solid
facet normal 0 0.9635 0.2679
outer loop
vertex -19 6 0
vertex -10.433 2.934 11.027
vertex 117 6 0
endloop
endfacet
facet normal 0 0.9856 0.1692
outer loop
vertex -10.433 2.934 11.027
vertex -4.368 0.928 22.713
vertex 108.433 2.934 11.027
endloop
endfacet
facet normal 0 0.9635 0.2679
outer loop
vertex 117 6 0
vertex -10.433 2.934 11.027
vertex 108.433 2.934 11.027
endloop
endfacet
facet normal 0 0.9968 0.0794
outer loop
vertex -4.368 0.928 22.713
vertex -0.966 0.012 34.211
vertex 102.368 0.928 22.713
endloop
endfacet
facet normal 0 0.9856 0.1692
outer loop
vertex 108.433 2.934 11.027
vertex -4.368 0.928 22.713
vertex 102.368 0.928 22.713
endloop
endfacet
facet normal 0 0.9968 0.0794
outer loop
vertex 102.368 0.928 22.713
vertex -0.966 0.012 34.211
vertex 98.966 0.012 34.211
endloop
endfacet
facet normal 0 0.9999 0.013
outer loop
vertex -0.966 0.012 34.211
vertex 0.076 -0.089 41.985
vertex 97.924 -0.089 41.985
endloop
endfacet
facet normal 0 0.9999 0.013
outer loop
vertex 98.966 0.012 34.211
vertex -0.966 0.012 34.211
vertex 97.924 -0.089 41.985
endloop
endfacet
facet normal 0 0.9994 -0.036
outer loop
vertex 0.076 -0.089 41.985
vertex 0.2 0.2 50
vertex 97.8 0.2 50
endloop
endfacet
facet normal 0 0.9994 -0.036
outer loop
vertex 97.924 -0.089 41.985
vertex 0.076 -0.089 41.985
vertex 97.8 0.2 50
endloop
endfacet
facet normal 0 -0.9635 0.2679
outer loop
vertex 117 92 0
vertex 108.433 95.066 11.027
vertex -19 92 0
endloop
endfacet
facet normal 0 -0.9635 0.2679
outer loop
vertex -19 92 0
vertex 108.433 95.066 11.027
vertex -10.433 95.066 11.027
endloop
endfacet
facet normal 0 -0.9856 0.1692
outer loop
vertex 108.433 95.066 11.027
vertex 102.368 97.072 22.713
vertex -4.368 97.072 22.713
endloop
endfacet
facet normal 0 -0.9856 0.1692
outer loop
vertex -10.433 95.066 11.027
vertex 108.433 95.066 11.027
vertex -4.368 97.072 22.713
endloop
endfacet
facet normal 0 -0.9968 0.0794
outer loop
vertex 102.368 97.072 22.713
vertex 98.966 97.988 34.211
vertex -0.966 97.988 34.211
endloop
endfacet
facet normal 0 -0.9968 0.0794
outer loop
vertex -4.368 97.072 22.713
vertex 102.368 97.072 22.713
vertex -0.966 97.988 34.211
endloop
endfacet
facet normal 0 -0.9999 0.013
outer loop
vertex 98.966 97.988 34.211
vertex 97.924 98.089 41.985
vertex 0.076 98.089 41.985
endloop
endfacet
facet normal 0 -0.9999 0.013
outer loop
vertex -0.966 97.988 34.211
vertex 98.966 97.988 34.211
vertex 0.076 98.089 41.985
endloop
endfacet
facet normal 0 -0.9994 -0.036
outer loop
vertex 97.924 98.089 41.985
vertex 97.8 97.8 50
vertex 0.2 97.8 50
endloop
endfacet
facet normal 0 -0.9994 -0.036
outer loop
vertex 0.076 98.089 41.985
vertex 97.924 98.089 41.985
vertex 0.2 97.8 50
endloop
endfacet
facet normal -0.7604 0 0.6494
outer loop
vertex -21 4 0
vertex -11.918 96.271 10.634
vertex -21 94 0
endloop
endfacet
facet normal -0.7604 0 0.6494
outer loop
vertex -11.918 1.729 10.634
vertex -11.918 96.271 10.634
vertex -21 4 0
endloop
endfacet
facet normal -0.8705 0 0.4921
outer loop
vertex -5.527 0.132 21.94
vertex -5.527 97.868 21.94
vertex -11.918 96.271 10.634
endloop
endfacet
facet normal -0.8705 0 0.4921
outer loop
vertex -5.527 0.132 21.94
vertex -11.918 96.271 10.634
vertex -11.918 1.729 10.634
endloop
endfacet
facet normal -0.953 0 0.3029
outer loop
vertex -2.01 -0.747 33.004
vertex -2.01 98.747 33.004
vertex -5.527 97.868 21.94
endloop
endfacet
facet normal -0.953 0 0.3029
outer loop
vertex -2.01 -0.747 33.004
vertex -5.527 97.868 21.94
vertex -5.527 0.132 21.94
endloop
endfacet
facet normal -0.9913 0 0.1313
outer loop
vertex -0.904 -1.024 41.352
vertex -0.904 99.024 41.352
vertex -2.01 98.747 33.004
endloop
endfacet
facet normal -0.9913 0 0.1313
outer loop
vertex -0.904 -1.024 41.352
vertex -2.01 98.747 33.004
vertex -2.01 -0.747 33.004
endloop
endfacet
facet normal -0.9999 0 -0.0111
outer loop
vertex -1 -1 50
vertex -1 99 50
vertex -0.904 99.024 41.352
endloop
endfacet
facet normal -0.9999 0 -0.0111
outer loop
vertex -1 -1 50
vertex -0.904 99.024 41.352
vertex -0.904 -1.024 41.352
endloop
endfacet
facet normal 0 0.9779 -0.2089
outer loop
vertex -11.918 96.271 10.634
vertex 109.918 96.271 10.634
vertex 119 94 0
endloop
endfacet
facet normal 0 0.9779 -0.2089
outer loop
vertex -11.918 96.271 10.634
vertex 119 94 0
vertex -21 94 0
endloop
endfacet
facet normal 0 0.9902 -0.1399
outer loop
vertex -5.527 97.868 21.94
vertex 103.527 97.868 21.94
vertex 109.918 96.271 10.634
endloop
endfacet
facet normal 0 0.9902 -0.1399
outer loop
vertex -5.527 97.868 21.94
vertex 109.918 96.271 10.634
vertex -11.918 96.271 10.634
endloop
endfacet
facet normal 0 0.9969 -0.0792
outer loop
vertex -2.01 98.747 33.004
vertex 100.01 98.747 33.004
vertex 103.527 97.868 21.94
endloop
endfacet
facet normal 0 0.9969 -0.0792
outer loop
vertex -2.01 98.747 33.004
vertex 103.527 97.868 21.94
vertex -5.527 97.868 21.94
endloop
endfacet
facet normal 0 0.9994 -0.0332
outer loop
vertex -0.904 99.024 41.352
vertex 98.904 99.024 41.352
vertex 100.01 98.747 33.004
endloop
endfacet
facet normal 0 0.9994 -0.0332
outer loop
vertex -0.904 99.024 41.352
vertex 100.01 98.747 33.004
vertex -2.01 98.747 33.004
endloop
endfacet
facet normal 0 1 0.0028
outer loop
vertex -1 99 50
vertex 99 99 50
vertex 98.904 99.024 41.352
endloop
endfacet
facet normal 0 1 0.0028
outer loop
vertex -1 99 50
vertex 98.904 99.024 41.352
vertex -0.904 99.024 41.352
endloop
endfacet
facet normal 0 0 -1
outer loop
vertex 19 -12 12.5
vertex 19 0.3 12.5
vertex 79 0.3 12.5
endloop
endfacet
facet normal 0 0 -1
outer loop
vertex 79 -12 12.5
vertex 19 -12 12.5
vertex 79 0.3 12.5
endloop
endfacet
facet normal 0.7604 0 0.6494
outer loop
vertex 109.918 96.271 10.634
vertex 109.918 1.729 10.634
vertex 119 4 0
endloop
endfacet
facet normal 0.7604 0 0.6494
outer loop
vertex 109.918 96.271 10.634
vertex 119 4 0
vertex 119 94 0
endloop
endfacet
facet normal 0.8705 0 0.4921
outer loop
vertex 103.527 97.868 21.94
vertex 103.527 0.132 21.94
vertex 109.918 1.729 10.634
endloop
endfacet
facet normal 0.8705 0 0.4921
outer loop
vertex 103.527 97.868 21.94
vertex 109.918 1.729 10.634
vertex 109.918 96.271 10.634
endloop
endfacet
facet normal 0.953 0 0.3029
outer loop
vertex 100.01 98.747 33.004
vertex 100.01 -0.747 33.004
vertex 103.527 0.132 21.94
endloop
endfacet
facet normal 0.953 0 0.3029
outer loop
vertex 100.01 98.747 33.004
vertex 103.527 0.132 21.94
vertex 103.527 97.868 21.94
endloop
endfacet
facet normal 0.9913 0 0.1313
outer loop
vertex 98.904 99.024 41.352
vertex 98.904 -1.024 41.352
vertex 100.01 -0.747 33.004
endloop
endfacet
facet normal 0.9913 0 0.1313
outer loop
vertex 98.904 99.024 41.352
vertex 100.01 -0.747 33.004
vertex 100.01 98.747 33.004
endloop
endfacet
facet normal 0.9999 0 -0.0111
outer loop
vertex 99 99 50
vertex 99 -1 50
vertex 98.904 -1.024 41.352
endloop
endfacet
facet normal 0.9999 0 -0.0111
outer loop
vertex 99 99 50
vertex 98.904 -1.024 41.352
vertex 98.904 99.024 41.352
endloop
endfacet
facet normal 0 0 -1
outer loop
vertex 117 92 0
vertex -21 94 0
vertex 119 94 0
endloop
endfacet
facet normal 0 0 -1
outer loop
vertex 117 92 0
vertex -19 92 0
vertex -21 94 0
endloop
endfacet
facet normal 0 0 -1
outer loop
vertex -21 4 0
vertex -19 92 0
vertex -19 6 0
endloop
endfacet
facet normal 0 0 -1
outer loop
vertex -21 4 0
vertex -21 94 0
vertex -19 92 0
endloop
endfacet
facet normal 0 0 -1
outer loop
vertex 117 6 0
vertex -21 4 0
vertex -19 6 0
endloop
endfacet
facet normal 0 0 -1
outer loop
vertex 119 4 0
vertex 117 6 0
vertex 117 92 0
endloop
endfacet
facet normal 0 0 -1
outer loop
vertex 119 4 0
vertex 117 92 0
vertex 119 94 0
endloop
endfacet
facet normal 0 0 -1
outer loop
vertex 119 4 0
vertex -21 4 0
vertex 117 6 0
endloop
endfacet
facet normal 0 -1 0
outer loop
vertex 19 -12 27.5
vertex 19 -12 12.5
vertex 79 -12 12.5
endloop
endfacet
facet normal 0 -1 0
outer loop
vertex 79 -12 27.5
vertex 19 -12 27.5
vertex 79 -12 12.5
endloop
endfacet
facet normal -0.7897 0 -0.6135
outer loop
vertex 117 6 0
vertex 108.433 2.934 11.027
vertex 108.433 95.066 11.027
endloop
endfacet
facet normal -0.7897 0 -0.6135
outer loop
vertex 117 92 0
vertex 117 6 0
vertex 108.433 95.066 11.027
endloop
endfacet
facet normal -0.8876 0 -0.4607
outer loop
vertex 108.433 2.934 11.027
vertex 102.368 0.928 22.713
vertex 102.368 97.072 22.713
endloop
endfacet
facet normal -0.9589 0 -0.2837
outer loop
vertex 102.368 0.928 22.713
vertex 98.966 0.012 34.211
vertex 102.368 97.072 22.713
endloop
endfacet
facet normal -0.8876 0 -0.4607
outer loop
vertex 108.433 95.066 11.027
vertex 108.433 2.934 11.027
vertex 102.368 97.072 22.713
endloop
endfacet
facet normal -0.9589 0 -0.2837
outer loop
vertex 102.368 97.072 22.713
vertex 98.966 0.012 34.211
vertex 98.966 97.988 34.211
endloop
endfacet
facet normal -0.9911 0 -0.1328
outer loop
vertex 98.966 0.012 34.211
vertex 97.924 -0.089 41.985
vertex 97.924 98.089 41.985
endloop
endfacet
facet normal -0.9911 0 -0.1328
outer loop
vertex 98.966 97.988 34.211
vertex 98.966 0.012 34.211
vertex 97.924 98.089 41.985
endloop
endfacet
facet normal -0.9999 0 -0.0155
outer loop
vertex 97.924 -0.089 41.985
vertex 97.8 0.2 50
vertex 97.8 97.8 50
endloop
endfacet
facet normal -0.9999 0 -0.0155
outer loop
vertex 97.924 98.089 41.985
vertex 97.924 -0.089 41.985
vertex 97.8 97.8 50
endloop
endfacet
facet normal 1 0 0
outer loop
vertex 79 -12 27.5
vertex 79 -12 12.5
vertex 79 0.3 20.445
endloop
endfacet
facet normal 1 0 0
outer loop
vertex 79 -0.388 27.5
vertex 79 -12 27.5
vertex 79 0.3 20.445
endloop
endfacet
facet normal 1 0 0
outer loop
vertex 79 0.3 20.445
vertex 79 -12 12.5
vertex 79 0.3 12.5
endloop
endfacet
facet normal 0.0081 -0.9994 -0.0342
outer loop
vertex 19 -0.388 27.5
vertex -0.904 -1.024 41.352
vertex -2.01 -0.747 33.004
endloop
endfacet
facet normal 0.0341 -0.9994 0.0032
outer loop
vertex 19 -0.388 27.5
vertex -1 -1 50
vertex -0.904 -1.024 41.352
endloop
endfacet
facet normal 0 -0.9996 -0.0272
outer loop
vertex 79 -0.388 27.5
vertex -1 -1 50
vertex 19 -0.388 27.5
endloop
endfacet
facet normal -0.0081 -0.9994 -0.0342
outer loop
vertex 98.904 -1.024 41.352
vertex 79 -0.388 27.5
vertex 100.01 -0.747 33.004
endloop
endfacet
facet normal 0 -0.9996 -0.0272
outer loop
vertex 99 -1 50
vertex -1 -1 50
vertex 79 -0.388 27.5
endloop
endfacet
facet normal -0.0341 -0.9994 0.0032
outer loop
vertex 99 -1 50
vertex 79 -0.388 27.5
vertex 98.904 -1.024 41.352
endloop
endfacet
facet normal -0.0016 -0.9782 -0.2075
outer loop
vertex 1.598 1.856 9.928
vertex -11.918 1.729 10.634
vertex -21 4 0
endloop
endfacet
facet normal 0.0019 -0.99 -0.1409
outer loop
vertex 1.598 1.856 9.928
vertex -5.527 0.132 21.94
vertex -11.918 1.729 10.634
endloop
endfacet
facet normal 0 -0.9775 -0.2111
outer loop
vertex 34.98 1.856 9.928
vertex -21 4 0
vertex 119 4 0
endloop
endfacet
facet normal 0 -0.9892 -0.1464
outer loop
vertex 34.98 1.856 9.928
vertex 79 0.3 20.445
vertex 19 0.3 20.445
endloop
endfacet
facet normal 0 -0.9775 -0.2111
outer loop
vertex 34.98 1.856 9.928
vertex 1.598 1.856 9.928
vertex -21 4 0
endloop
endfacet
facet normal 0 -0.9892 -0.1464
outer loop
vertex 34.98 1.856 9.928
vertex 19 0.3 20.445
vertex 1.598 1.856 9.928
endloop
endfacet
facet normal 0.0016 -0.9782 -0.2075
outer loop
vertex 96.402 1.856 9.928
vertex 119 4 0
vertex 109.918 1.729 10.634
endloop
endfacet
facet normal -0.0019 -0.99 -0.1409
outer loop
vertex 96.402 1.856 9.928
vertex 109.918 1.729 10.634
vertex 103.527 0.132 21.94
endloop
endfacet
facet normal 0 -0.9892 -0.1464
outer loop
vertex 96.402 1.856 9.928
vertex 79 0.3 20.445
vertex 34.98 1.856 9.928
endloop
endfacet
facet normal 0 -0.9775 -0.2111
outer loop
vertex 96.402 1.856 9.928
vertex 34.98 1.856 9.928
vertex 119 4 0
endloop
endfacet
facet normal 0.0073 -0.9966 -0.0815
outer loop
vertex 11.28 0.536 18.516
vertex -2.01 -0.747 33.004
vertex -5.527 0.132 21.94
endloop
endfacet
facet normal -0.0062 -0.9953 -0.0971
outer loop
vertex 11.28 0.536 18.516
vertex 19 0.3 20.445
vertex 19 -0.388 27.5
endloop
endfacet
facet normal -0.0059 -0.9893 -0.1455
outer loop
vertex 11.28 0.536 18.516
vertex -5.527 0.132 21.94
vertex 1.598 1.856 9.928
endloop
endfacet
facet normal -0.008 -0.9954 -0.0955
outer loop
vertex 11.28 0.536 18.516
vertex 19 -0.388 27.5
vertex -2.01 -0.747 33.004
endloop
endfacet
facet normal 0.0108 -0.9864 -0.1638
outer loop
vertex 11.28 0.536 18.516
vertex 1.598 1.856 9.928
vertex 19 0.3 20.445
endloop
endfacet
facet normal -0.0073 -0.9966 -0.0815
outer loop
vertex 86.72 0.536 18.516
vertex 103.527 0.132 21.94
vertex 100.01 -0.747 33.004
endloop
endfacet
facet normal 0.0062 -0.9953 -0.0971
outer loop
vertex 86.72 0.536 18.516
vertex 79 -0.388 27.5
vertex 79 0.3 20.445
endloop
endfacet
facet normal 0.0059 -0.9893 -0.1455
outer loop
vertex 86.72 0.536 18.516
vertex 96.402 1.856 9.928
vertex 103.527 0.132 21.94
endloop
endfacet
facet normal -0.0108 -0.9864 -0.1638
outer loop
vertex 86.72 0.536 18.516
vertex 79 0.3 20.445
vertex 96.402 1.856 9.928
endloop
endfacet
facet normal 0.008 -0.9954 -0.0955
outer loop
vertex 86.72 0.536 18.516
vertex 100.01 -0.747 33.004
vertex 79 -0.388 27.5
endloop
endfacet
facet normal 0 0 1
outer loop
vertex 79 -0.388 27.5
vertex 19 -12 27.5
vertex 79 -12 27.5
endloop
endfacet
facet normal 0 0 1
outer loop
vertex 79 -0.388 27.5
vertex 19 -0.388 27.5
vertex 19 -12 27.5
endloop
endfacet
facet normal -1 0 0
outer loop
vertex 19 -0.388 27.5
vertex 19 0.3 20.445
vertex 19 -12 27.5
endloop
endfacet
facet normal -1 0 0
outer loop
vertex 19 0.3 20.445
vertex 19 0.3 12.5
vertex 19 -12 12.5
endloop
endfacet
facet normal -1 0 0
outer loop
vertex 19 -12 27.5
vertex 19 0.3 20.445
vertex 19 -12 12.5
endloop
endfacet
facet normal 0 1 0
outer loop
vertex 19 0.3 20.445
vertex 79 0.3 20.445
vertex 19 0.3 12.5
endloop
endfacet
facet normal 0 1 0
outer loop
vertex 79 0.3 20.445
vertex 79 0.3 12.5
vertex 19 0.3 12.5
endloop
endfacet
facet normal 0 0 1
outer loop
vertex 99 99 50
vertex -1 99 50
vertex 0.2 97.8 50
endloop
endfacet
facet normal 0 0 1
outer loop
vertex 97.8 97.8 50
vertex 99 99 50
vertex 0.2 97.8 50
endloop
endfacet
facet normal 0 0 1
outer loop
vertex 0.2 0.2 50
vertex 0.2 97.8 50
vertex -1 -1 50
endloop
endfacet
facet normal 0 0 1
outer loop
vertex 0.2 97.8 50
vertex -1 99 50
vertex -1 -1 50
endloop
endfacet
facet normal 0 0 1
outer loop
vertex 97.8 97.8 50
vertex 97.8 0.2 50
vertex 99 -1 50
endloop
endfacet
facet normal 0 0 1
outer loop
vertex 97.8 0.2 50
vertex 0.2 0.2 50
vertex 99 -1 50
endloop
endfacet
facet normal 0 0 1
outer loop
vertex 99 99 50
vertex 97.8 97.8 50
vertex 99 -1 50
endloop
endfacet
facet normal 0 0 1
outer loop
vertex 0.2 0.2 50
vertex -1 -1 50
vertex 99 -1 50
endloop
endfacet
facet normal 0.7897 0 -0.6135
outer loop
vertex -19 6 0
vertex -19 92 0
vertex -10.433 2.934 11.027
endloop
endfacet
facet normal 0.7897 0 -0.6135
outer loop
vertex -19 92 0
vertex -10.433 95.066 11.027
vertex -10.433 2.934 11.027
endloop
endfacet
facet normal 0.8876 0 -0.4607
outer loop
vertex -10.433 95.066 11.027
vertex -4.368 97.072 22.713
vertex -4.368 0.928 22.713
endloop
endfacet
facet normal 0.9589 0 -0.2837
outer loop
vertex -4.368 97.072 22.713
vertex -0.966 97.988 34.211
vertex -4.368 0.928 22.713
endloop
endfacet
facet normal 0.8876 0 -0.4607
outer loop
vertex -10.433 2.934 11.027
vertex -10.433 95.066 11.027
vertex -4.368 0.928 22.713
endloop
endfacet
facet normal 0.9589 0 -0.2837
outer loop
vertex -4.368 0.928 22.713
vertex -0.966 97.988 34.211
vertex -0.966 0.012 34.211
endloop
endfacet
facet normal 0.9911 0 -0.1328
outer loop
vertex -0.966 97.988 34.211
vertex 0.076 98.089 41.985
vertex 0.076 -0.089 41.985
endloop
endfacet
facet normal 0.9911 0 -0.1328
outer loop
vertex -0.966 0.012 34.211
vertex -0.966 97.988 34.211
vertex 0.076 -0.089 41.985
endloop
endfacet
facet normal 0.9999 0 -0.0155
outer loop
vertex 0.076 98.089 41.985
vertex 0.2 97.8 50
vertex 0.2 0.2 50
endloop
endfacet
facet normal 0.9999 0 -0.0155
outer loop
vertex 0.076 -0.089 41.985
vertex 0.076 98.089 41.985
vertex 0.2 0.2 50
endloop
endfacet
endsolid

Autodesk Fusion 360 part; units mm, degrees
ref_plane "WorkPlane1" through (0, 0, 40) normal (0, 0, 1) x (1, 0, 0)
ref_plane "WorkPlane2" through (0, 0, 50) normal (0, 0, 1) x (1, 0, 0)
sketch "Sketch1" plane through (0, 0, 0) normal (0, 0, 1) x (1, 0, 0)
  line L0 (-21, 4) -> (119, 4)
  line L1 (119, 4) -> (119, 94)
  line L2 (119, 94) -> (-21, 94)
  line L3 (-21, 94) -> (-21, 4)
sketch "Sketch2" plane through (0, 0, 40) normal (0, 0, 1) x (1, 0, 0)
  line L0 (-1, -1) -> (99, -1)
  line L1 (99, -1) -> (99, 99)
  line L2 (99, 99) -> (-1, 99)
  line L3 (-1, 99) -> (-1, -1)
sketch "Sketch3" plane through (0, 0, 50) normal (0, 0, 1) x (1, 0, 0)
  line L0 (-1, -1) -> (99, -1)
  line L1 (99, -1) -> (99, 99)
  line L2 (99, 99) -> (-1, 99)
  line L3 (-1, 99) -> (-1, -1)
loft "Loft1" add profiles "Sketch1", "Sketch2", "Sketch3" section 1 section 2 section 3
sketch "Sketch4" plane through (0, 0, 0) normal (0, 0, 1) x (1, 0, 0)
  line L0 (-19, 6) -> (117, 6)
  line L1 (117, 6) -> (117, 92)
  line L2 (117, 92) -> (-19, 92)
  line L3 (-19, 92) -> (-19, 6)
sketch "Sketch5" plane through (0, 0, 40) normal (0, 0, 1) x (1, 0, 0)
  line L0 (-0.1, -0.1) -> (98.1, -0.1)
  line L1 (98.1, -0.1) -> (98.1, 98.1)
  line L2 (98.1, 98.1) -> (-0.1, 98.1)
  line L3 (-0.1, 98.1) -> (-0.1, -0.1)
sketch "Sketch6" plane through (0, 0, 50) normal (0, 0, 1) x (1, 0, 0)
  line L0 (0.2, 0.2) -> (97.8, 0.2)
  line L1 (97.8, 0.2) -> (97.8, 97.8)
  line L2 (97.8, 97.8) -> (0.2, 97.8)
  line L3 (0.2, 97.8) -> (0.2, 0.2)
loft "Loft2" cut profiles "Sketch4", "Sketch5", "Sketch6" section 1 section 2 section 3
ref_plane "WorkPlane3" through (0, 0, 12.5) normal (0, 0, 1) x (1, 0, 0)
sketch "Sketch7" plane through (0, 0, 12.5) normal (0, 0, 1) x (1, 0, 0)
  line L0 (19, -12) -> (79, -12)
  line L1 (79, -12) -> (79, 0.3)
  line L2 (79, 0.3) -> (19, 0.3)
  line L3 (19, 0.3) -> (19, -12)
extrude "Extrude1" add sketch "Sketch7" along normal blind 15
